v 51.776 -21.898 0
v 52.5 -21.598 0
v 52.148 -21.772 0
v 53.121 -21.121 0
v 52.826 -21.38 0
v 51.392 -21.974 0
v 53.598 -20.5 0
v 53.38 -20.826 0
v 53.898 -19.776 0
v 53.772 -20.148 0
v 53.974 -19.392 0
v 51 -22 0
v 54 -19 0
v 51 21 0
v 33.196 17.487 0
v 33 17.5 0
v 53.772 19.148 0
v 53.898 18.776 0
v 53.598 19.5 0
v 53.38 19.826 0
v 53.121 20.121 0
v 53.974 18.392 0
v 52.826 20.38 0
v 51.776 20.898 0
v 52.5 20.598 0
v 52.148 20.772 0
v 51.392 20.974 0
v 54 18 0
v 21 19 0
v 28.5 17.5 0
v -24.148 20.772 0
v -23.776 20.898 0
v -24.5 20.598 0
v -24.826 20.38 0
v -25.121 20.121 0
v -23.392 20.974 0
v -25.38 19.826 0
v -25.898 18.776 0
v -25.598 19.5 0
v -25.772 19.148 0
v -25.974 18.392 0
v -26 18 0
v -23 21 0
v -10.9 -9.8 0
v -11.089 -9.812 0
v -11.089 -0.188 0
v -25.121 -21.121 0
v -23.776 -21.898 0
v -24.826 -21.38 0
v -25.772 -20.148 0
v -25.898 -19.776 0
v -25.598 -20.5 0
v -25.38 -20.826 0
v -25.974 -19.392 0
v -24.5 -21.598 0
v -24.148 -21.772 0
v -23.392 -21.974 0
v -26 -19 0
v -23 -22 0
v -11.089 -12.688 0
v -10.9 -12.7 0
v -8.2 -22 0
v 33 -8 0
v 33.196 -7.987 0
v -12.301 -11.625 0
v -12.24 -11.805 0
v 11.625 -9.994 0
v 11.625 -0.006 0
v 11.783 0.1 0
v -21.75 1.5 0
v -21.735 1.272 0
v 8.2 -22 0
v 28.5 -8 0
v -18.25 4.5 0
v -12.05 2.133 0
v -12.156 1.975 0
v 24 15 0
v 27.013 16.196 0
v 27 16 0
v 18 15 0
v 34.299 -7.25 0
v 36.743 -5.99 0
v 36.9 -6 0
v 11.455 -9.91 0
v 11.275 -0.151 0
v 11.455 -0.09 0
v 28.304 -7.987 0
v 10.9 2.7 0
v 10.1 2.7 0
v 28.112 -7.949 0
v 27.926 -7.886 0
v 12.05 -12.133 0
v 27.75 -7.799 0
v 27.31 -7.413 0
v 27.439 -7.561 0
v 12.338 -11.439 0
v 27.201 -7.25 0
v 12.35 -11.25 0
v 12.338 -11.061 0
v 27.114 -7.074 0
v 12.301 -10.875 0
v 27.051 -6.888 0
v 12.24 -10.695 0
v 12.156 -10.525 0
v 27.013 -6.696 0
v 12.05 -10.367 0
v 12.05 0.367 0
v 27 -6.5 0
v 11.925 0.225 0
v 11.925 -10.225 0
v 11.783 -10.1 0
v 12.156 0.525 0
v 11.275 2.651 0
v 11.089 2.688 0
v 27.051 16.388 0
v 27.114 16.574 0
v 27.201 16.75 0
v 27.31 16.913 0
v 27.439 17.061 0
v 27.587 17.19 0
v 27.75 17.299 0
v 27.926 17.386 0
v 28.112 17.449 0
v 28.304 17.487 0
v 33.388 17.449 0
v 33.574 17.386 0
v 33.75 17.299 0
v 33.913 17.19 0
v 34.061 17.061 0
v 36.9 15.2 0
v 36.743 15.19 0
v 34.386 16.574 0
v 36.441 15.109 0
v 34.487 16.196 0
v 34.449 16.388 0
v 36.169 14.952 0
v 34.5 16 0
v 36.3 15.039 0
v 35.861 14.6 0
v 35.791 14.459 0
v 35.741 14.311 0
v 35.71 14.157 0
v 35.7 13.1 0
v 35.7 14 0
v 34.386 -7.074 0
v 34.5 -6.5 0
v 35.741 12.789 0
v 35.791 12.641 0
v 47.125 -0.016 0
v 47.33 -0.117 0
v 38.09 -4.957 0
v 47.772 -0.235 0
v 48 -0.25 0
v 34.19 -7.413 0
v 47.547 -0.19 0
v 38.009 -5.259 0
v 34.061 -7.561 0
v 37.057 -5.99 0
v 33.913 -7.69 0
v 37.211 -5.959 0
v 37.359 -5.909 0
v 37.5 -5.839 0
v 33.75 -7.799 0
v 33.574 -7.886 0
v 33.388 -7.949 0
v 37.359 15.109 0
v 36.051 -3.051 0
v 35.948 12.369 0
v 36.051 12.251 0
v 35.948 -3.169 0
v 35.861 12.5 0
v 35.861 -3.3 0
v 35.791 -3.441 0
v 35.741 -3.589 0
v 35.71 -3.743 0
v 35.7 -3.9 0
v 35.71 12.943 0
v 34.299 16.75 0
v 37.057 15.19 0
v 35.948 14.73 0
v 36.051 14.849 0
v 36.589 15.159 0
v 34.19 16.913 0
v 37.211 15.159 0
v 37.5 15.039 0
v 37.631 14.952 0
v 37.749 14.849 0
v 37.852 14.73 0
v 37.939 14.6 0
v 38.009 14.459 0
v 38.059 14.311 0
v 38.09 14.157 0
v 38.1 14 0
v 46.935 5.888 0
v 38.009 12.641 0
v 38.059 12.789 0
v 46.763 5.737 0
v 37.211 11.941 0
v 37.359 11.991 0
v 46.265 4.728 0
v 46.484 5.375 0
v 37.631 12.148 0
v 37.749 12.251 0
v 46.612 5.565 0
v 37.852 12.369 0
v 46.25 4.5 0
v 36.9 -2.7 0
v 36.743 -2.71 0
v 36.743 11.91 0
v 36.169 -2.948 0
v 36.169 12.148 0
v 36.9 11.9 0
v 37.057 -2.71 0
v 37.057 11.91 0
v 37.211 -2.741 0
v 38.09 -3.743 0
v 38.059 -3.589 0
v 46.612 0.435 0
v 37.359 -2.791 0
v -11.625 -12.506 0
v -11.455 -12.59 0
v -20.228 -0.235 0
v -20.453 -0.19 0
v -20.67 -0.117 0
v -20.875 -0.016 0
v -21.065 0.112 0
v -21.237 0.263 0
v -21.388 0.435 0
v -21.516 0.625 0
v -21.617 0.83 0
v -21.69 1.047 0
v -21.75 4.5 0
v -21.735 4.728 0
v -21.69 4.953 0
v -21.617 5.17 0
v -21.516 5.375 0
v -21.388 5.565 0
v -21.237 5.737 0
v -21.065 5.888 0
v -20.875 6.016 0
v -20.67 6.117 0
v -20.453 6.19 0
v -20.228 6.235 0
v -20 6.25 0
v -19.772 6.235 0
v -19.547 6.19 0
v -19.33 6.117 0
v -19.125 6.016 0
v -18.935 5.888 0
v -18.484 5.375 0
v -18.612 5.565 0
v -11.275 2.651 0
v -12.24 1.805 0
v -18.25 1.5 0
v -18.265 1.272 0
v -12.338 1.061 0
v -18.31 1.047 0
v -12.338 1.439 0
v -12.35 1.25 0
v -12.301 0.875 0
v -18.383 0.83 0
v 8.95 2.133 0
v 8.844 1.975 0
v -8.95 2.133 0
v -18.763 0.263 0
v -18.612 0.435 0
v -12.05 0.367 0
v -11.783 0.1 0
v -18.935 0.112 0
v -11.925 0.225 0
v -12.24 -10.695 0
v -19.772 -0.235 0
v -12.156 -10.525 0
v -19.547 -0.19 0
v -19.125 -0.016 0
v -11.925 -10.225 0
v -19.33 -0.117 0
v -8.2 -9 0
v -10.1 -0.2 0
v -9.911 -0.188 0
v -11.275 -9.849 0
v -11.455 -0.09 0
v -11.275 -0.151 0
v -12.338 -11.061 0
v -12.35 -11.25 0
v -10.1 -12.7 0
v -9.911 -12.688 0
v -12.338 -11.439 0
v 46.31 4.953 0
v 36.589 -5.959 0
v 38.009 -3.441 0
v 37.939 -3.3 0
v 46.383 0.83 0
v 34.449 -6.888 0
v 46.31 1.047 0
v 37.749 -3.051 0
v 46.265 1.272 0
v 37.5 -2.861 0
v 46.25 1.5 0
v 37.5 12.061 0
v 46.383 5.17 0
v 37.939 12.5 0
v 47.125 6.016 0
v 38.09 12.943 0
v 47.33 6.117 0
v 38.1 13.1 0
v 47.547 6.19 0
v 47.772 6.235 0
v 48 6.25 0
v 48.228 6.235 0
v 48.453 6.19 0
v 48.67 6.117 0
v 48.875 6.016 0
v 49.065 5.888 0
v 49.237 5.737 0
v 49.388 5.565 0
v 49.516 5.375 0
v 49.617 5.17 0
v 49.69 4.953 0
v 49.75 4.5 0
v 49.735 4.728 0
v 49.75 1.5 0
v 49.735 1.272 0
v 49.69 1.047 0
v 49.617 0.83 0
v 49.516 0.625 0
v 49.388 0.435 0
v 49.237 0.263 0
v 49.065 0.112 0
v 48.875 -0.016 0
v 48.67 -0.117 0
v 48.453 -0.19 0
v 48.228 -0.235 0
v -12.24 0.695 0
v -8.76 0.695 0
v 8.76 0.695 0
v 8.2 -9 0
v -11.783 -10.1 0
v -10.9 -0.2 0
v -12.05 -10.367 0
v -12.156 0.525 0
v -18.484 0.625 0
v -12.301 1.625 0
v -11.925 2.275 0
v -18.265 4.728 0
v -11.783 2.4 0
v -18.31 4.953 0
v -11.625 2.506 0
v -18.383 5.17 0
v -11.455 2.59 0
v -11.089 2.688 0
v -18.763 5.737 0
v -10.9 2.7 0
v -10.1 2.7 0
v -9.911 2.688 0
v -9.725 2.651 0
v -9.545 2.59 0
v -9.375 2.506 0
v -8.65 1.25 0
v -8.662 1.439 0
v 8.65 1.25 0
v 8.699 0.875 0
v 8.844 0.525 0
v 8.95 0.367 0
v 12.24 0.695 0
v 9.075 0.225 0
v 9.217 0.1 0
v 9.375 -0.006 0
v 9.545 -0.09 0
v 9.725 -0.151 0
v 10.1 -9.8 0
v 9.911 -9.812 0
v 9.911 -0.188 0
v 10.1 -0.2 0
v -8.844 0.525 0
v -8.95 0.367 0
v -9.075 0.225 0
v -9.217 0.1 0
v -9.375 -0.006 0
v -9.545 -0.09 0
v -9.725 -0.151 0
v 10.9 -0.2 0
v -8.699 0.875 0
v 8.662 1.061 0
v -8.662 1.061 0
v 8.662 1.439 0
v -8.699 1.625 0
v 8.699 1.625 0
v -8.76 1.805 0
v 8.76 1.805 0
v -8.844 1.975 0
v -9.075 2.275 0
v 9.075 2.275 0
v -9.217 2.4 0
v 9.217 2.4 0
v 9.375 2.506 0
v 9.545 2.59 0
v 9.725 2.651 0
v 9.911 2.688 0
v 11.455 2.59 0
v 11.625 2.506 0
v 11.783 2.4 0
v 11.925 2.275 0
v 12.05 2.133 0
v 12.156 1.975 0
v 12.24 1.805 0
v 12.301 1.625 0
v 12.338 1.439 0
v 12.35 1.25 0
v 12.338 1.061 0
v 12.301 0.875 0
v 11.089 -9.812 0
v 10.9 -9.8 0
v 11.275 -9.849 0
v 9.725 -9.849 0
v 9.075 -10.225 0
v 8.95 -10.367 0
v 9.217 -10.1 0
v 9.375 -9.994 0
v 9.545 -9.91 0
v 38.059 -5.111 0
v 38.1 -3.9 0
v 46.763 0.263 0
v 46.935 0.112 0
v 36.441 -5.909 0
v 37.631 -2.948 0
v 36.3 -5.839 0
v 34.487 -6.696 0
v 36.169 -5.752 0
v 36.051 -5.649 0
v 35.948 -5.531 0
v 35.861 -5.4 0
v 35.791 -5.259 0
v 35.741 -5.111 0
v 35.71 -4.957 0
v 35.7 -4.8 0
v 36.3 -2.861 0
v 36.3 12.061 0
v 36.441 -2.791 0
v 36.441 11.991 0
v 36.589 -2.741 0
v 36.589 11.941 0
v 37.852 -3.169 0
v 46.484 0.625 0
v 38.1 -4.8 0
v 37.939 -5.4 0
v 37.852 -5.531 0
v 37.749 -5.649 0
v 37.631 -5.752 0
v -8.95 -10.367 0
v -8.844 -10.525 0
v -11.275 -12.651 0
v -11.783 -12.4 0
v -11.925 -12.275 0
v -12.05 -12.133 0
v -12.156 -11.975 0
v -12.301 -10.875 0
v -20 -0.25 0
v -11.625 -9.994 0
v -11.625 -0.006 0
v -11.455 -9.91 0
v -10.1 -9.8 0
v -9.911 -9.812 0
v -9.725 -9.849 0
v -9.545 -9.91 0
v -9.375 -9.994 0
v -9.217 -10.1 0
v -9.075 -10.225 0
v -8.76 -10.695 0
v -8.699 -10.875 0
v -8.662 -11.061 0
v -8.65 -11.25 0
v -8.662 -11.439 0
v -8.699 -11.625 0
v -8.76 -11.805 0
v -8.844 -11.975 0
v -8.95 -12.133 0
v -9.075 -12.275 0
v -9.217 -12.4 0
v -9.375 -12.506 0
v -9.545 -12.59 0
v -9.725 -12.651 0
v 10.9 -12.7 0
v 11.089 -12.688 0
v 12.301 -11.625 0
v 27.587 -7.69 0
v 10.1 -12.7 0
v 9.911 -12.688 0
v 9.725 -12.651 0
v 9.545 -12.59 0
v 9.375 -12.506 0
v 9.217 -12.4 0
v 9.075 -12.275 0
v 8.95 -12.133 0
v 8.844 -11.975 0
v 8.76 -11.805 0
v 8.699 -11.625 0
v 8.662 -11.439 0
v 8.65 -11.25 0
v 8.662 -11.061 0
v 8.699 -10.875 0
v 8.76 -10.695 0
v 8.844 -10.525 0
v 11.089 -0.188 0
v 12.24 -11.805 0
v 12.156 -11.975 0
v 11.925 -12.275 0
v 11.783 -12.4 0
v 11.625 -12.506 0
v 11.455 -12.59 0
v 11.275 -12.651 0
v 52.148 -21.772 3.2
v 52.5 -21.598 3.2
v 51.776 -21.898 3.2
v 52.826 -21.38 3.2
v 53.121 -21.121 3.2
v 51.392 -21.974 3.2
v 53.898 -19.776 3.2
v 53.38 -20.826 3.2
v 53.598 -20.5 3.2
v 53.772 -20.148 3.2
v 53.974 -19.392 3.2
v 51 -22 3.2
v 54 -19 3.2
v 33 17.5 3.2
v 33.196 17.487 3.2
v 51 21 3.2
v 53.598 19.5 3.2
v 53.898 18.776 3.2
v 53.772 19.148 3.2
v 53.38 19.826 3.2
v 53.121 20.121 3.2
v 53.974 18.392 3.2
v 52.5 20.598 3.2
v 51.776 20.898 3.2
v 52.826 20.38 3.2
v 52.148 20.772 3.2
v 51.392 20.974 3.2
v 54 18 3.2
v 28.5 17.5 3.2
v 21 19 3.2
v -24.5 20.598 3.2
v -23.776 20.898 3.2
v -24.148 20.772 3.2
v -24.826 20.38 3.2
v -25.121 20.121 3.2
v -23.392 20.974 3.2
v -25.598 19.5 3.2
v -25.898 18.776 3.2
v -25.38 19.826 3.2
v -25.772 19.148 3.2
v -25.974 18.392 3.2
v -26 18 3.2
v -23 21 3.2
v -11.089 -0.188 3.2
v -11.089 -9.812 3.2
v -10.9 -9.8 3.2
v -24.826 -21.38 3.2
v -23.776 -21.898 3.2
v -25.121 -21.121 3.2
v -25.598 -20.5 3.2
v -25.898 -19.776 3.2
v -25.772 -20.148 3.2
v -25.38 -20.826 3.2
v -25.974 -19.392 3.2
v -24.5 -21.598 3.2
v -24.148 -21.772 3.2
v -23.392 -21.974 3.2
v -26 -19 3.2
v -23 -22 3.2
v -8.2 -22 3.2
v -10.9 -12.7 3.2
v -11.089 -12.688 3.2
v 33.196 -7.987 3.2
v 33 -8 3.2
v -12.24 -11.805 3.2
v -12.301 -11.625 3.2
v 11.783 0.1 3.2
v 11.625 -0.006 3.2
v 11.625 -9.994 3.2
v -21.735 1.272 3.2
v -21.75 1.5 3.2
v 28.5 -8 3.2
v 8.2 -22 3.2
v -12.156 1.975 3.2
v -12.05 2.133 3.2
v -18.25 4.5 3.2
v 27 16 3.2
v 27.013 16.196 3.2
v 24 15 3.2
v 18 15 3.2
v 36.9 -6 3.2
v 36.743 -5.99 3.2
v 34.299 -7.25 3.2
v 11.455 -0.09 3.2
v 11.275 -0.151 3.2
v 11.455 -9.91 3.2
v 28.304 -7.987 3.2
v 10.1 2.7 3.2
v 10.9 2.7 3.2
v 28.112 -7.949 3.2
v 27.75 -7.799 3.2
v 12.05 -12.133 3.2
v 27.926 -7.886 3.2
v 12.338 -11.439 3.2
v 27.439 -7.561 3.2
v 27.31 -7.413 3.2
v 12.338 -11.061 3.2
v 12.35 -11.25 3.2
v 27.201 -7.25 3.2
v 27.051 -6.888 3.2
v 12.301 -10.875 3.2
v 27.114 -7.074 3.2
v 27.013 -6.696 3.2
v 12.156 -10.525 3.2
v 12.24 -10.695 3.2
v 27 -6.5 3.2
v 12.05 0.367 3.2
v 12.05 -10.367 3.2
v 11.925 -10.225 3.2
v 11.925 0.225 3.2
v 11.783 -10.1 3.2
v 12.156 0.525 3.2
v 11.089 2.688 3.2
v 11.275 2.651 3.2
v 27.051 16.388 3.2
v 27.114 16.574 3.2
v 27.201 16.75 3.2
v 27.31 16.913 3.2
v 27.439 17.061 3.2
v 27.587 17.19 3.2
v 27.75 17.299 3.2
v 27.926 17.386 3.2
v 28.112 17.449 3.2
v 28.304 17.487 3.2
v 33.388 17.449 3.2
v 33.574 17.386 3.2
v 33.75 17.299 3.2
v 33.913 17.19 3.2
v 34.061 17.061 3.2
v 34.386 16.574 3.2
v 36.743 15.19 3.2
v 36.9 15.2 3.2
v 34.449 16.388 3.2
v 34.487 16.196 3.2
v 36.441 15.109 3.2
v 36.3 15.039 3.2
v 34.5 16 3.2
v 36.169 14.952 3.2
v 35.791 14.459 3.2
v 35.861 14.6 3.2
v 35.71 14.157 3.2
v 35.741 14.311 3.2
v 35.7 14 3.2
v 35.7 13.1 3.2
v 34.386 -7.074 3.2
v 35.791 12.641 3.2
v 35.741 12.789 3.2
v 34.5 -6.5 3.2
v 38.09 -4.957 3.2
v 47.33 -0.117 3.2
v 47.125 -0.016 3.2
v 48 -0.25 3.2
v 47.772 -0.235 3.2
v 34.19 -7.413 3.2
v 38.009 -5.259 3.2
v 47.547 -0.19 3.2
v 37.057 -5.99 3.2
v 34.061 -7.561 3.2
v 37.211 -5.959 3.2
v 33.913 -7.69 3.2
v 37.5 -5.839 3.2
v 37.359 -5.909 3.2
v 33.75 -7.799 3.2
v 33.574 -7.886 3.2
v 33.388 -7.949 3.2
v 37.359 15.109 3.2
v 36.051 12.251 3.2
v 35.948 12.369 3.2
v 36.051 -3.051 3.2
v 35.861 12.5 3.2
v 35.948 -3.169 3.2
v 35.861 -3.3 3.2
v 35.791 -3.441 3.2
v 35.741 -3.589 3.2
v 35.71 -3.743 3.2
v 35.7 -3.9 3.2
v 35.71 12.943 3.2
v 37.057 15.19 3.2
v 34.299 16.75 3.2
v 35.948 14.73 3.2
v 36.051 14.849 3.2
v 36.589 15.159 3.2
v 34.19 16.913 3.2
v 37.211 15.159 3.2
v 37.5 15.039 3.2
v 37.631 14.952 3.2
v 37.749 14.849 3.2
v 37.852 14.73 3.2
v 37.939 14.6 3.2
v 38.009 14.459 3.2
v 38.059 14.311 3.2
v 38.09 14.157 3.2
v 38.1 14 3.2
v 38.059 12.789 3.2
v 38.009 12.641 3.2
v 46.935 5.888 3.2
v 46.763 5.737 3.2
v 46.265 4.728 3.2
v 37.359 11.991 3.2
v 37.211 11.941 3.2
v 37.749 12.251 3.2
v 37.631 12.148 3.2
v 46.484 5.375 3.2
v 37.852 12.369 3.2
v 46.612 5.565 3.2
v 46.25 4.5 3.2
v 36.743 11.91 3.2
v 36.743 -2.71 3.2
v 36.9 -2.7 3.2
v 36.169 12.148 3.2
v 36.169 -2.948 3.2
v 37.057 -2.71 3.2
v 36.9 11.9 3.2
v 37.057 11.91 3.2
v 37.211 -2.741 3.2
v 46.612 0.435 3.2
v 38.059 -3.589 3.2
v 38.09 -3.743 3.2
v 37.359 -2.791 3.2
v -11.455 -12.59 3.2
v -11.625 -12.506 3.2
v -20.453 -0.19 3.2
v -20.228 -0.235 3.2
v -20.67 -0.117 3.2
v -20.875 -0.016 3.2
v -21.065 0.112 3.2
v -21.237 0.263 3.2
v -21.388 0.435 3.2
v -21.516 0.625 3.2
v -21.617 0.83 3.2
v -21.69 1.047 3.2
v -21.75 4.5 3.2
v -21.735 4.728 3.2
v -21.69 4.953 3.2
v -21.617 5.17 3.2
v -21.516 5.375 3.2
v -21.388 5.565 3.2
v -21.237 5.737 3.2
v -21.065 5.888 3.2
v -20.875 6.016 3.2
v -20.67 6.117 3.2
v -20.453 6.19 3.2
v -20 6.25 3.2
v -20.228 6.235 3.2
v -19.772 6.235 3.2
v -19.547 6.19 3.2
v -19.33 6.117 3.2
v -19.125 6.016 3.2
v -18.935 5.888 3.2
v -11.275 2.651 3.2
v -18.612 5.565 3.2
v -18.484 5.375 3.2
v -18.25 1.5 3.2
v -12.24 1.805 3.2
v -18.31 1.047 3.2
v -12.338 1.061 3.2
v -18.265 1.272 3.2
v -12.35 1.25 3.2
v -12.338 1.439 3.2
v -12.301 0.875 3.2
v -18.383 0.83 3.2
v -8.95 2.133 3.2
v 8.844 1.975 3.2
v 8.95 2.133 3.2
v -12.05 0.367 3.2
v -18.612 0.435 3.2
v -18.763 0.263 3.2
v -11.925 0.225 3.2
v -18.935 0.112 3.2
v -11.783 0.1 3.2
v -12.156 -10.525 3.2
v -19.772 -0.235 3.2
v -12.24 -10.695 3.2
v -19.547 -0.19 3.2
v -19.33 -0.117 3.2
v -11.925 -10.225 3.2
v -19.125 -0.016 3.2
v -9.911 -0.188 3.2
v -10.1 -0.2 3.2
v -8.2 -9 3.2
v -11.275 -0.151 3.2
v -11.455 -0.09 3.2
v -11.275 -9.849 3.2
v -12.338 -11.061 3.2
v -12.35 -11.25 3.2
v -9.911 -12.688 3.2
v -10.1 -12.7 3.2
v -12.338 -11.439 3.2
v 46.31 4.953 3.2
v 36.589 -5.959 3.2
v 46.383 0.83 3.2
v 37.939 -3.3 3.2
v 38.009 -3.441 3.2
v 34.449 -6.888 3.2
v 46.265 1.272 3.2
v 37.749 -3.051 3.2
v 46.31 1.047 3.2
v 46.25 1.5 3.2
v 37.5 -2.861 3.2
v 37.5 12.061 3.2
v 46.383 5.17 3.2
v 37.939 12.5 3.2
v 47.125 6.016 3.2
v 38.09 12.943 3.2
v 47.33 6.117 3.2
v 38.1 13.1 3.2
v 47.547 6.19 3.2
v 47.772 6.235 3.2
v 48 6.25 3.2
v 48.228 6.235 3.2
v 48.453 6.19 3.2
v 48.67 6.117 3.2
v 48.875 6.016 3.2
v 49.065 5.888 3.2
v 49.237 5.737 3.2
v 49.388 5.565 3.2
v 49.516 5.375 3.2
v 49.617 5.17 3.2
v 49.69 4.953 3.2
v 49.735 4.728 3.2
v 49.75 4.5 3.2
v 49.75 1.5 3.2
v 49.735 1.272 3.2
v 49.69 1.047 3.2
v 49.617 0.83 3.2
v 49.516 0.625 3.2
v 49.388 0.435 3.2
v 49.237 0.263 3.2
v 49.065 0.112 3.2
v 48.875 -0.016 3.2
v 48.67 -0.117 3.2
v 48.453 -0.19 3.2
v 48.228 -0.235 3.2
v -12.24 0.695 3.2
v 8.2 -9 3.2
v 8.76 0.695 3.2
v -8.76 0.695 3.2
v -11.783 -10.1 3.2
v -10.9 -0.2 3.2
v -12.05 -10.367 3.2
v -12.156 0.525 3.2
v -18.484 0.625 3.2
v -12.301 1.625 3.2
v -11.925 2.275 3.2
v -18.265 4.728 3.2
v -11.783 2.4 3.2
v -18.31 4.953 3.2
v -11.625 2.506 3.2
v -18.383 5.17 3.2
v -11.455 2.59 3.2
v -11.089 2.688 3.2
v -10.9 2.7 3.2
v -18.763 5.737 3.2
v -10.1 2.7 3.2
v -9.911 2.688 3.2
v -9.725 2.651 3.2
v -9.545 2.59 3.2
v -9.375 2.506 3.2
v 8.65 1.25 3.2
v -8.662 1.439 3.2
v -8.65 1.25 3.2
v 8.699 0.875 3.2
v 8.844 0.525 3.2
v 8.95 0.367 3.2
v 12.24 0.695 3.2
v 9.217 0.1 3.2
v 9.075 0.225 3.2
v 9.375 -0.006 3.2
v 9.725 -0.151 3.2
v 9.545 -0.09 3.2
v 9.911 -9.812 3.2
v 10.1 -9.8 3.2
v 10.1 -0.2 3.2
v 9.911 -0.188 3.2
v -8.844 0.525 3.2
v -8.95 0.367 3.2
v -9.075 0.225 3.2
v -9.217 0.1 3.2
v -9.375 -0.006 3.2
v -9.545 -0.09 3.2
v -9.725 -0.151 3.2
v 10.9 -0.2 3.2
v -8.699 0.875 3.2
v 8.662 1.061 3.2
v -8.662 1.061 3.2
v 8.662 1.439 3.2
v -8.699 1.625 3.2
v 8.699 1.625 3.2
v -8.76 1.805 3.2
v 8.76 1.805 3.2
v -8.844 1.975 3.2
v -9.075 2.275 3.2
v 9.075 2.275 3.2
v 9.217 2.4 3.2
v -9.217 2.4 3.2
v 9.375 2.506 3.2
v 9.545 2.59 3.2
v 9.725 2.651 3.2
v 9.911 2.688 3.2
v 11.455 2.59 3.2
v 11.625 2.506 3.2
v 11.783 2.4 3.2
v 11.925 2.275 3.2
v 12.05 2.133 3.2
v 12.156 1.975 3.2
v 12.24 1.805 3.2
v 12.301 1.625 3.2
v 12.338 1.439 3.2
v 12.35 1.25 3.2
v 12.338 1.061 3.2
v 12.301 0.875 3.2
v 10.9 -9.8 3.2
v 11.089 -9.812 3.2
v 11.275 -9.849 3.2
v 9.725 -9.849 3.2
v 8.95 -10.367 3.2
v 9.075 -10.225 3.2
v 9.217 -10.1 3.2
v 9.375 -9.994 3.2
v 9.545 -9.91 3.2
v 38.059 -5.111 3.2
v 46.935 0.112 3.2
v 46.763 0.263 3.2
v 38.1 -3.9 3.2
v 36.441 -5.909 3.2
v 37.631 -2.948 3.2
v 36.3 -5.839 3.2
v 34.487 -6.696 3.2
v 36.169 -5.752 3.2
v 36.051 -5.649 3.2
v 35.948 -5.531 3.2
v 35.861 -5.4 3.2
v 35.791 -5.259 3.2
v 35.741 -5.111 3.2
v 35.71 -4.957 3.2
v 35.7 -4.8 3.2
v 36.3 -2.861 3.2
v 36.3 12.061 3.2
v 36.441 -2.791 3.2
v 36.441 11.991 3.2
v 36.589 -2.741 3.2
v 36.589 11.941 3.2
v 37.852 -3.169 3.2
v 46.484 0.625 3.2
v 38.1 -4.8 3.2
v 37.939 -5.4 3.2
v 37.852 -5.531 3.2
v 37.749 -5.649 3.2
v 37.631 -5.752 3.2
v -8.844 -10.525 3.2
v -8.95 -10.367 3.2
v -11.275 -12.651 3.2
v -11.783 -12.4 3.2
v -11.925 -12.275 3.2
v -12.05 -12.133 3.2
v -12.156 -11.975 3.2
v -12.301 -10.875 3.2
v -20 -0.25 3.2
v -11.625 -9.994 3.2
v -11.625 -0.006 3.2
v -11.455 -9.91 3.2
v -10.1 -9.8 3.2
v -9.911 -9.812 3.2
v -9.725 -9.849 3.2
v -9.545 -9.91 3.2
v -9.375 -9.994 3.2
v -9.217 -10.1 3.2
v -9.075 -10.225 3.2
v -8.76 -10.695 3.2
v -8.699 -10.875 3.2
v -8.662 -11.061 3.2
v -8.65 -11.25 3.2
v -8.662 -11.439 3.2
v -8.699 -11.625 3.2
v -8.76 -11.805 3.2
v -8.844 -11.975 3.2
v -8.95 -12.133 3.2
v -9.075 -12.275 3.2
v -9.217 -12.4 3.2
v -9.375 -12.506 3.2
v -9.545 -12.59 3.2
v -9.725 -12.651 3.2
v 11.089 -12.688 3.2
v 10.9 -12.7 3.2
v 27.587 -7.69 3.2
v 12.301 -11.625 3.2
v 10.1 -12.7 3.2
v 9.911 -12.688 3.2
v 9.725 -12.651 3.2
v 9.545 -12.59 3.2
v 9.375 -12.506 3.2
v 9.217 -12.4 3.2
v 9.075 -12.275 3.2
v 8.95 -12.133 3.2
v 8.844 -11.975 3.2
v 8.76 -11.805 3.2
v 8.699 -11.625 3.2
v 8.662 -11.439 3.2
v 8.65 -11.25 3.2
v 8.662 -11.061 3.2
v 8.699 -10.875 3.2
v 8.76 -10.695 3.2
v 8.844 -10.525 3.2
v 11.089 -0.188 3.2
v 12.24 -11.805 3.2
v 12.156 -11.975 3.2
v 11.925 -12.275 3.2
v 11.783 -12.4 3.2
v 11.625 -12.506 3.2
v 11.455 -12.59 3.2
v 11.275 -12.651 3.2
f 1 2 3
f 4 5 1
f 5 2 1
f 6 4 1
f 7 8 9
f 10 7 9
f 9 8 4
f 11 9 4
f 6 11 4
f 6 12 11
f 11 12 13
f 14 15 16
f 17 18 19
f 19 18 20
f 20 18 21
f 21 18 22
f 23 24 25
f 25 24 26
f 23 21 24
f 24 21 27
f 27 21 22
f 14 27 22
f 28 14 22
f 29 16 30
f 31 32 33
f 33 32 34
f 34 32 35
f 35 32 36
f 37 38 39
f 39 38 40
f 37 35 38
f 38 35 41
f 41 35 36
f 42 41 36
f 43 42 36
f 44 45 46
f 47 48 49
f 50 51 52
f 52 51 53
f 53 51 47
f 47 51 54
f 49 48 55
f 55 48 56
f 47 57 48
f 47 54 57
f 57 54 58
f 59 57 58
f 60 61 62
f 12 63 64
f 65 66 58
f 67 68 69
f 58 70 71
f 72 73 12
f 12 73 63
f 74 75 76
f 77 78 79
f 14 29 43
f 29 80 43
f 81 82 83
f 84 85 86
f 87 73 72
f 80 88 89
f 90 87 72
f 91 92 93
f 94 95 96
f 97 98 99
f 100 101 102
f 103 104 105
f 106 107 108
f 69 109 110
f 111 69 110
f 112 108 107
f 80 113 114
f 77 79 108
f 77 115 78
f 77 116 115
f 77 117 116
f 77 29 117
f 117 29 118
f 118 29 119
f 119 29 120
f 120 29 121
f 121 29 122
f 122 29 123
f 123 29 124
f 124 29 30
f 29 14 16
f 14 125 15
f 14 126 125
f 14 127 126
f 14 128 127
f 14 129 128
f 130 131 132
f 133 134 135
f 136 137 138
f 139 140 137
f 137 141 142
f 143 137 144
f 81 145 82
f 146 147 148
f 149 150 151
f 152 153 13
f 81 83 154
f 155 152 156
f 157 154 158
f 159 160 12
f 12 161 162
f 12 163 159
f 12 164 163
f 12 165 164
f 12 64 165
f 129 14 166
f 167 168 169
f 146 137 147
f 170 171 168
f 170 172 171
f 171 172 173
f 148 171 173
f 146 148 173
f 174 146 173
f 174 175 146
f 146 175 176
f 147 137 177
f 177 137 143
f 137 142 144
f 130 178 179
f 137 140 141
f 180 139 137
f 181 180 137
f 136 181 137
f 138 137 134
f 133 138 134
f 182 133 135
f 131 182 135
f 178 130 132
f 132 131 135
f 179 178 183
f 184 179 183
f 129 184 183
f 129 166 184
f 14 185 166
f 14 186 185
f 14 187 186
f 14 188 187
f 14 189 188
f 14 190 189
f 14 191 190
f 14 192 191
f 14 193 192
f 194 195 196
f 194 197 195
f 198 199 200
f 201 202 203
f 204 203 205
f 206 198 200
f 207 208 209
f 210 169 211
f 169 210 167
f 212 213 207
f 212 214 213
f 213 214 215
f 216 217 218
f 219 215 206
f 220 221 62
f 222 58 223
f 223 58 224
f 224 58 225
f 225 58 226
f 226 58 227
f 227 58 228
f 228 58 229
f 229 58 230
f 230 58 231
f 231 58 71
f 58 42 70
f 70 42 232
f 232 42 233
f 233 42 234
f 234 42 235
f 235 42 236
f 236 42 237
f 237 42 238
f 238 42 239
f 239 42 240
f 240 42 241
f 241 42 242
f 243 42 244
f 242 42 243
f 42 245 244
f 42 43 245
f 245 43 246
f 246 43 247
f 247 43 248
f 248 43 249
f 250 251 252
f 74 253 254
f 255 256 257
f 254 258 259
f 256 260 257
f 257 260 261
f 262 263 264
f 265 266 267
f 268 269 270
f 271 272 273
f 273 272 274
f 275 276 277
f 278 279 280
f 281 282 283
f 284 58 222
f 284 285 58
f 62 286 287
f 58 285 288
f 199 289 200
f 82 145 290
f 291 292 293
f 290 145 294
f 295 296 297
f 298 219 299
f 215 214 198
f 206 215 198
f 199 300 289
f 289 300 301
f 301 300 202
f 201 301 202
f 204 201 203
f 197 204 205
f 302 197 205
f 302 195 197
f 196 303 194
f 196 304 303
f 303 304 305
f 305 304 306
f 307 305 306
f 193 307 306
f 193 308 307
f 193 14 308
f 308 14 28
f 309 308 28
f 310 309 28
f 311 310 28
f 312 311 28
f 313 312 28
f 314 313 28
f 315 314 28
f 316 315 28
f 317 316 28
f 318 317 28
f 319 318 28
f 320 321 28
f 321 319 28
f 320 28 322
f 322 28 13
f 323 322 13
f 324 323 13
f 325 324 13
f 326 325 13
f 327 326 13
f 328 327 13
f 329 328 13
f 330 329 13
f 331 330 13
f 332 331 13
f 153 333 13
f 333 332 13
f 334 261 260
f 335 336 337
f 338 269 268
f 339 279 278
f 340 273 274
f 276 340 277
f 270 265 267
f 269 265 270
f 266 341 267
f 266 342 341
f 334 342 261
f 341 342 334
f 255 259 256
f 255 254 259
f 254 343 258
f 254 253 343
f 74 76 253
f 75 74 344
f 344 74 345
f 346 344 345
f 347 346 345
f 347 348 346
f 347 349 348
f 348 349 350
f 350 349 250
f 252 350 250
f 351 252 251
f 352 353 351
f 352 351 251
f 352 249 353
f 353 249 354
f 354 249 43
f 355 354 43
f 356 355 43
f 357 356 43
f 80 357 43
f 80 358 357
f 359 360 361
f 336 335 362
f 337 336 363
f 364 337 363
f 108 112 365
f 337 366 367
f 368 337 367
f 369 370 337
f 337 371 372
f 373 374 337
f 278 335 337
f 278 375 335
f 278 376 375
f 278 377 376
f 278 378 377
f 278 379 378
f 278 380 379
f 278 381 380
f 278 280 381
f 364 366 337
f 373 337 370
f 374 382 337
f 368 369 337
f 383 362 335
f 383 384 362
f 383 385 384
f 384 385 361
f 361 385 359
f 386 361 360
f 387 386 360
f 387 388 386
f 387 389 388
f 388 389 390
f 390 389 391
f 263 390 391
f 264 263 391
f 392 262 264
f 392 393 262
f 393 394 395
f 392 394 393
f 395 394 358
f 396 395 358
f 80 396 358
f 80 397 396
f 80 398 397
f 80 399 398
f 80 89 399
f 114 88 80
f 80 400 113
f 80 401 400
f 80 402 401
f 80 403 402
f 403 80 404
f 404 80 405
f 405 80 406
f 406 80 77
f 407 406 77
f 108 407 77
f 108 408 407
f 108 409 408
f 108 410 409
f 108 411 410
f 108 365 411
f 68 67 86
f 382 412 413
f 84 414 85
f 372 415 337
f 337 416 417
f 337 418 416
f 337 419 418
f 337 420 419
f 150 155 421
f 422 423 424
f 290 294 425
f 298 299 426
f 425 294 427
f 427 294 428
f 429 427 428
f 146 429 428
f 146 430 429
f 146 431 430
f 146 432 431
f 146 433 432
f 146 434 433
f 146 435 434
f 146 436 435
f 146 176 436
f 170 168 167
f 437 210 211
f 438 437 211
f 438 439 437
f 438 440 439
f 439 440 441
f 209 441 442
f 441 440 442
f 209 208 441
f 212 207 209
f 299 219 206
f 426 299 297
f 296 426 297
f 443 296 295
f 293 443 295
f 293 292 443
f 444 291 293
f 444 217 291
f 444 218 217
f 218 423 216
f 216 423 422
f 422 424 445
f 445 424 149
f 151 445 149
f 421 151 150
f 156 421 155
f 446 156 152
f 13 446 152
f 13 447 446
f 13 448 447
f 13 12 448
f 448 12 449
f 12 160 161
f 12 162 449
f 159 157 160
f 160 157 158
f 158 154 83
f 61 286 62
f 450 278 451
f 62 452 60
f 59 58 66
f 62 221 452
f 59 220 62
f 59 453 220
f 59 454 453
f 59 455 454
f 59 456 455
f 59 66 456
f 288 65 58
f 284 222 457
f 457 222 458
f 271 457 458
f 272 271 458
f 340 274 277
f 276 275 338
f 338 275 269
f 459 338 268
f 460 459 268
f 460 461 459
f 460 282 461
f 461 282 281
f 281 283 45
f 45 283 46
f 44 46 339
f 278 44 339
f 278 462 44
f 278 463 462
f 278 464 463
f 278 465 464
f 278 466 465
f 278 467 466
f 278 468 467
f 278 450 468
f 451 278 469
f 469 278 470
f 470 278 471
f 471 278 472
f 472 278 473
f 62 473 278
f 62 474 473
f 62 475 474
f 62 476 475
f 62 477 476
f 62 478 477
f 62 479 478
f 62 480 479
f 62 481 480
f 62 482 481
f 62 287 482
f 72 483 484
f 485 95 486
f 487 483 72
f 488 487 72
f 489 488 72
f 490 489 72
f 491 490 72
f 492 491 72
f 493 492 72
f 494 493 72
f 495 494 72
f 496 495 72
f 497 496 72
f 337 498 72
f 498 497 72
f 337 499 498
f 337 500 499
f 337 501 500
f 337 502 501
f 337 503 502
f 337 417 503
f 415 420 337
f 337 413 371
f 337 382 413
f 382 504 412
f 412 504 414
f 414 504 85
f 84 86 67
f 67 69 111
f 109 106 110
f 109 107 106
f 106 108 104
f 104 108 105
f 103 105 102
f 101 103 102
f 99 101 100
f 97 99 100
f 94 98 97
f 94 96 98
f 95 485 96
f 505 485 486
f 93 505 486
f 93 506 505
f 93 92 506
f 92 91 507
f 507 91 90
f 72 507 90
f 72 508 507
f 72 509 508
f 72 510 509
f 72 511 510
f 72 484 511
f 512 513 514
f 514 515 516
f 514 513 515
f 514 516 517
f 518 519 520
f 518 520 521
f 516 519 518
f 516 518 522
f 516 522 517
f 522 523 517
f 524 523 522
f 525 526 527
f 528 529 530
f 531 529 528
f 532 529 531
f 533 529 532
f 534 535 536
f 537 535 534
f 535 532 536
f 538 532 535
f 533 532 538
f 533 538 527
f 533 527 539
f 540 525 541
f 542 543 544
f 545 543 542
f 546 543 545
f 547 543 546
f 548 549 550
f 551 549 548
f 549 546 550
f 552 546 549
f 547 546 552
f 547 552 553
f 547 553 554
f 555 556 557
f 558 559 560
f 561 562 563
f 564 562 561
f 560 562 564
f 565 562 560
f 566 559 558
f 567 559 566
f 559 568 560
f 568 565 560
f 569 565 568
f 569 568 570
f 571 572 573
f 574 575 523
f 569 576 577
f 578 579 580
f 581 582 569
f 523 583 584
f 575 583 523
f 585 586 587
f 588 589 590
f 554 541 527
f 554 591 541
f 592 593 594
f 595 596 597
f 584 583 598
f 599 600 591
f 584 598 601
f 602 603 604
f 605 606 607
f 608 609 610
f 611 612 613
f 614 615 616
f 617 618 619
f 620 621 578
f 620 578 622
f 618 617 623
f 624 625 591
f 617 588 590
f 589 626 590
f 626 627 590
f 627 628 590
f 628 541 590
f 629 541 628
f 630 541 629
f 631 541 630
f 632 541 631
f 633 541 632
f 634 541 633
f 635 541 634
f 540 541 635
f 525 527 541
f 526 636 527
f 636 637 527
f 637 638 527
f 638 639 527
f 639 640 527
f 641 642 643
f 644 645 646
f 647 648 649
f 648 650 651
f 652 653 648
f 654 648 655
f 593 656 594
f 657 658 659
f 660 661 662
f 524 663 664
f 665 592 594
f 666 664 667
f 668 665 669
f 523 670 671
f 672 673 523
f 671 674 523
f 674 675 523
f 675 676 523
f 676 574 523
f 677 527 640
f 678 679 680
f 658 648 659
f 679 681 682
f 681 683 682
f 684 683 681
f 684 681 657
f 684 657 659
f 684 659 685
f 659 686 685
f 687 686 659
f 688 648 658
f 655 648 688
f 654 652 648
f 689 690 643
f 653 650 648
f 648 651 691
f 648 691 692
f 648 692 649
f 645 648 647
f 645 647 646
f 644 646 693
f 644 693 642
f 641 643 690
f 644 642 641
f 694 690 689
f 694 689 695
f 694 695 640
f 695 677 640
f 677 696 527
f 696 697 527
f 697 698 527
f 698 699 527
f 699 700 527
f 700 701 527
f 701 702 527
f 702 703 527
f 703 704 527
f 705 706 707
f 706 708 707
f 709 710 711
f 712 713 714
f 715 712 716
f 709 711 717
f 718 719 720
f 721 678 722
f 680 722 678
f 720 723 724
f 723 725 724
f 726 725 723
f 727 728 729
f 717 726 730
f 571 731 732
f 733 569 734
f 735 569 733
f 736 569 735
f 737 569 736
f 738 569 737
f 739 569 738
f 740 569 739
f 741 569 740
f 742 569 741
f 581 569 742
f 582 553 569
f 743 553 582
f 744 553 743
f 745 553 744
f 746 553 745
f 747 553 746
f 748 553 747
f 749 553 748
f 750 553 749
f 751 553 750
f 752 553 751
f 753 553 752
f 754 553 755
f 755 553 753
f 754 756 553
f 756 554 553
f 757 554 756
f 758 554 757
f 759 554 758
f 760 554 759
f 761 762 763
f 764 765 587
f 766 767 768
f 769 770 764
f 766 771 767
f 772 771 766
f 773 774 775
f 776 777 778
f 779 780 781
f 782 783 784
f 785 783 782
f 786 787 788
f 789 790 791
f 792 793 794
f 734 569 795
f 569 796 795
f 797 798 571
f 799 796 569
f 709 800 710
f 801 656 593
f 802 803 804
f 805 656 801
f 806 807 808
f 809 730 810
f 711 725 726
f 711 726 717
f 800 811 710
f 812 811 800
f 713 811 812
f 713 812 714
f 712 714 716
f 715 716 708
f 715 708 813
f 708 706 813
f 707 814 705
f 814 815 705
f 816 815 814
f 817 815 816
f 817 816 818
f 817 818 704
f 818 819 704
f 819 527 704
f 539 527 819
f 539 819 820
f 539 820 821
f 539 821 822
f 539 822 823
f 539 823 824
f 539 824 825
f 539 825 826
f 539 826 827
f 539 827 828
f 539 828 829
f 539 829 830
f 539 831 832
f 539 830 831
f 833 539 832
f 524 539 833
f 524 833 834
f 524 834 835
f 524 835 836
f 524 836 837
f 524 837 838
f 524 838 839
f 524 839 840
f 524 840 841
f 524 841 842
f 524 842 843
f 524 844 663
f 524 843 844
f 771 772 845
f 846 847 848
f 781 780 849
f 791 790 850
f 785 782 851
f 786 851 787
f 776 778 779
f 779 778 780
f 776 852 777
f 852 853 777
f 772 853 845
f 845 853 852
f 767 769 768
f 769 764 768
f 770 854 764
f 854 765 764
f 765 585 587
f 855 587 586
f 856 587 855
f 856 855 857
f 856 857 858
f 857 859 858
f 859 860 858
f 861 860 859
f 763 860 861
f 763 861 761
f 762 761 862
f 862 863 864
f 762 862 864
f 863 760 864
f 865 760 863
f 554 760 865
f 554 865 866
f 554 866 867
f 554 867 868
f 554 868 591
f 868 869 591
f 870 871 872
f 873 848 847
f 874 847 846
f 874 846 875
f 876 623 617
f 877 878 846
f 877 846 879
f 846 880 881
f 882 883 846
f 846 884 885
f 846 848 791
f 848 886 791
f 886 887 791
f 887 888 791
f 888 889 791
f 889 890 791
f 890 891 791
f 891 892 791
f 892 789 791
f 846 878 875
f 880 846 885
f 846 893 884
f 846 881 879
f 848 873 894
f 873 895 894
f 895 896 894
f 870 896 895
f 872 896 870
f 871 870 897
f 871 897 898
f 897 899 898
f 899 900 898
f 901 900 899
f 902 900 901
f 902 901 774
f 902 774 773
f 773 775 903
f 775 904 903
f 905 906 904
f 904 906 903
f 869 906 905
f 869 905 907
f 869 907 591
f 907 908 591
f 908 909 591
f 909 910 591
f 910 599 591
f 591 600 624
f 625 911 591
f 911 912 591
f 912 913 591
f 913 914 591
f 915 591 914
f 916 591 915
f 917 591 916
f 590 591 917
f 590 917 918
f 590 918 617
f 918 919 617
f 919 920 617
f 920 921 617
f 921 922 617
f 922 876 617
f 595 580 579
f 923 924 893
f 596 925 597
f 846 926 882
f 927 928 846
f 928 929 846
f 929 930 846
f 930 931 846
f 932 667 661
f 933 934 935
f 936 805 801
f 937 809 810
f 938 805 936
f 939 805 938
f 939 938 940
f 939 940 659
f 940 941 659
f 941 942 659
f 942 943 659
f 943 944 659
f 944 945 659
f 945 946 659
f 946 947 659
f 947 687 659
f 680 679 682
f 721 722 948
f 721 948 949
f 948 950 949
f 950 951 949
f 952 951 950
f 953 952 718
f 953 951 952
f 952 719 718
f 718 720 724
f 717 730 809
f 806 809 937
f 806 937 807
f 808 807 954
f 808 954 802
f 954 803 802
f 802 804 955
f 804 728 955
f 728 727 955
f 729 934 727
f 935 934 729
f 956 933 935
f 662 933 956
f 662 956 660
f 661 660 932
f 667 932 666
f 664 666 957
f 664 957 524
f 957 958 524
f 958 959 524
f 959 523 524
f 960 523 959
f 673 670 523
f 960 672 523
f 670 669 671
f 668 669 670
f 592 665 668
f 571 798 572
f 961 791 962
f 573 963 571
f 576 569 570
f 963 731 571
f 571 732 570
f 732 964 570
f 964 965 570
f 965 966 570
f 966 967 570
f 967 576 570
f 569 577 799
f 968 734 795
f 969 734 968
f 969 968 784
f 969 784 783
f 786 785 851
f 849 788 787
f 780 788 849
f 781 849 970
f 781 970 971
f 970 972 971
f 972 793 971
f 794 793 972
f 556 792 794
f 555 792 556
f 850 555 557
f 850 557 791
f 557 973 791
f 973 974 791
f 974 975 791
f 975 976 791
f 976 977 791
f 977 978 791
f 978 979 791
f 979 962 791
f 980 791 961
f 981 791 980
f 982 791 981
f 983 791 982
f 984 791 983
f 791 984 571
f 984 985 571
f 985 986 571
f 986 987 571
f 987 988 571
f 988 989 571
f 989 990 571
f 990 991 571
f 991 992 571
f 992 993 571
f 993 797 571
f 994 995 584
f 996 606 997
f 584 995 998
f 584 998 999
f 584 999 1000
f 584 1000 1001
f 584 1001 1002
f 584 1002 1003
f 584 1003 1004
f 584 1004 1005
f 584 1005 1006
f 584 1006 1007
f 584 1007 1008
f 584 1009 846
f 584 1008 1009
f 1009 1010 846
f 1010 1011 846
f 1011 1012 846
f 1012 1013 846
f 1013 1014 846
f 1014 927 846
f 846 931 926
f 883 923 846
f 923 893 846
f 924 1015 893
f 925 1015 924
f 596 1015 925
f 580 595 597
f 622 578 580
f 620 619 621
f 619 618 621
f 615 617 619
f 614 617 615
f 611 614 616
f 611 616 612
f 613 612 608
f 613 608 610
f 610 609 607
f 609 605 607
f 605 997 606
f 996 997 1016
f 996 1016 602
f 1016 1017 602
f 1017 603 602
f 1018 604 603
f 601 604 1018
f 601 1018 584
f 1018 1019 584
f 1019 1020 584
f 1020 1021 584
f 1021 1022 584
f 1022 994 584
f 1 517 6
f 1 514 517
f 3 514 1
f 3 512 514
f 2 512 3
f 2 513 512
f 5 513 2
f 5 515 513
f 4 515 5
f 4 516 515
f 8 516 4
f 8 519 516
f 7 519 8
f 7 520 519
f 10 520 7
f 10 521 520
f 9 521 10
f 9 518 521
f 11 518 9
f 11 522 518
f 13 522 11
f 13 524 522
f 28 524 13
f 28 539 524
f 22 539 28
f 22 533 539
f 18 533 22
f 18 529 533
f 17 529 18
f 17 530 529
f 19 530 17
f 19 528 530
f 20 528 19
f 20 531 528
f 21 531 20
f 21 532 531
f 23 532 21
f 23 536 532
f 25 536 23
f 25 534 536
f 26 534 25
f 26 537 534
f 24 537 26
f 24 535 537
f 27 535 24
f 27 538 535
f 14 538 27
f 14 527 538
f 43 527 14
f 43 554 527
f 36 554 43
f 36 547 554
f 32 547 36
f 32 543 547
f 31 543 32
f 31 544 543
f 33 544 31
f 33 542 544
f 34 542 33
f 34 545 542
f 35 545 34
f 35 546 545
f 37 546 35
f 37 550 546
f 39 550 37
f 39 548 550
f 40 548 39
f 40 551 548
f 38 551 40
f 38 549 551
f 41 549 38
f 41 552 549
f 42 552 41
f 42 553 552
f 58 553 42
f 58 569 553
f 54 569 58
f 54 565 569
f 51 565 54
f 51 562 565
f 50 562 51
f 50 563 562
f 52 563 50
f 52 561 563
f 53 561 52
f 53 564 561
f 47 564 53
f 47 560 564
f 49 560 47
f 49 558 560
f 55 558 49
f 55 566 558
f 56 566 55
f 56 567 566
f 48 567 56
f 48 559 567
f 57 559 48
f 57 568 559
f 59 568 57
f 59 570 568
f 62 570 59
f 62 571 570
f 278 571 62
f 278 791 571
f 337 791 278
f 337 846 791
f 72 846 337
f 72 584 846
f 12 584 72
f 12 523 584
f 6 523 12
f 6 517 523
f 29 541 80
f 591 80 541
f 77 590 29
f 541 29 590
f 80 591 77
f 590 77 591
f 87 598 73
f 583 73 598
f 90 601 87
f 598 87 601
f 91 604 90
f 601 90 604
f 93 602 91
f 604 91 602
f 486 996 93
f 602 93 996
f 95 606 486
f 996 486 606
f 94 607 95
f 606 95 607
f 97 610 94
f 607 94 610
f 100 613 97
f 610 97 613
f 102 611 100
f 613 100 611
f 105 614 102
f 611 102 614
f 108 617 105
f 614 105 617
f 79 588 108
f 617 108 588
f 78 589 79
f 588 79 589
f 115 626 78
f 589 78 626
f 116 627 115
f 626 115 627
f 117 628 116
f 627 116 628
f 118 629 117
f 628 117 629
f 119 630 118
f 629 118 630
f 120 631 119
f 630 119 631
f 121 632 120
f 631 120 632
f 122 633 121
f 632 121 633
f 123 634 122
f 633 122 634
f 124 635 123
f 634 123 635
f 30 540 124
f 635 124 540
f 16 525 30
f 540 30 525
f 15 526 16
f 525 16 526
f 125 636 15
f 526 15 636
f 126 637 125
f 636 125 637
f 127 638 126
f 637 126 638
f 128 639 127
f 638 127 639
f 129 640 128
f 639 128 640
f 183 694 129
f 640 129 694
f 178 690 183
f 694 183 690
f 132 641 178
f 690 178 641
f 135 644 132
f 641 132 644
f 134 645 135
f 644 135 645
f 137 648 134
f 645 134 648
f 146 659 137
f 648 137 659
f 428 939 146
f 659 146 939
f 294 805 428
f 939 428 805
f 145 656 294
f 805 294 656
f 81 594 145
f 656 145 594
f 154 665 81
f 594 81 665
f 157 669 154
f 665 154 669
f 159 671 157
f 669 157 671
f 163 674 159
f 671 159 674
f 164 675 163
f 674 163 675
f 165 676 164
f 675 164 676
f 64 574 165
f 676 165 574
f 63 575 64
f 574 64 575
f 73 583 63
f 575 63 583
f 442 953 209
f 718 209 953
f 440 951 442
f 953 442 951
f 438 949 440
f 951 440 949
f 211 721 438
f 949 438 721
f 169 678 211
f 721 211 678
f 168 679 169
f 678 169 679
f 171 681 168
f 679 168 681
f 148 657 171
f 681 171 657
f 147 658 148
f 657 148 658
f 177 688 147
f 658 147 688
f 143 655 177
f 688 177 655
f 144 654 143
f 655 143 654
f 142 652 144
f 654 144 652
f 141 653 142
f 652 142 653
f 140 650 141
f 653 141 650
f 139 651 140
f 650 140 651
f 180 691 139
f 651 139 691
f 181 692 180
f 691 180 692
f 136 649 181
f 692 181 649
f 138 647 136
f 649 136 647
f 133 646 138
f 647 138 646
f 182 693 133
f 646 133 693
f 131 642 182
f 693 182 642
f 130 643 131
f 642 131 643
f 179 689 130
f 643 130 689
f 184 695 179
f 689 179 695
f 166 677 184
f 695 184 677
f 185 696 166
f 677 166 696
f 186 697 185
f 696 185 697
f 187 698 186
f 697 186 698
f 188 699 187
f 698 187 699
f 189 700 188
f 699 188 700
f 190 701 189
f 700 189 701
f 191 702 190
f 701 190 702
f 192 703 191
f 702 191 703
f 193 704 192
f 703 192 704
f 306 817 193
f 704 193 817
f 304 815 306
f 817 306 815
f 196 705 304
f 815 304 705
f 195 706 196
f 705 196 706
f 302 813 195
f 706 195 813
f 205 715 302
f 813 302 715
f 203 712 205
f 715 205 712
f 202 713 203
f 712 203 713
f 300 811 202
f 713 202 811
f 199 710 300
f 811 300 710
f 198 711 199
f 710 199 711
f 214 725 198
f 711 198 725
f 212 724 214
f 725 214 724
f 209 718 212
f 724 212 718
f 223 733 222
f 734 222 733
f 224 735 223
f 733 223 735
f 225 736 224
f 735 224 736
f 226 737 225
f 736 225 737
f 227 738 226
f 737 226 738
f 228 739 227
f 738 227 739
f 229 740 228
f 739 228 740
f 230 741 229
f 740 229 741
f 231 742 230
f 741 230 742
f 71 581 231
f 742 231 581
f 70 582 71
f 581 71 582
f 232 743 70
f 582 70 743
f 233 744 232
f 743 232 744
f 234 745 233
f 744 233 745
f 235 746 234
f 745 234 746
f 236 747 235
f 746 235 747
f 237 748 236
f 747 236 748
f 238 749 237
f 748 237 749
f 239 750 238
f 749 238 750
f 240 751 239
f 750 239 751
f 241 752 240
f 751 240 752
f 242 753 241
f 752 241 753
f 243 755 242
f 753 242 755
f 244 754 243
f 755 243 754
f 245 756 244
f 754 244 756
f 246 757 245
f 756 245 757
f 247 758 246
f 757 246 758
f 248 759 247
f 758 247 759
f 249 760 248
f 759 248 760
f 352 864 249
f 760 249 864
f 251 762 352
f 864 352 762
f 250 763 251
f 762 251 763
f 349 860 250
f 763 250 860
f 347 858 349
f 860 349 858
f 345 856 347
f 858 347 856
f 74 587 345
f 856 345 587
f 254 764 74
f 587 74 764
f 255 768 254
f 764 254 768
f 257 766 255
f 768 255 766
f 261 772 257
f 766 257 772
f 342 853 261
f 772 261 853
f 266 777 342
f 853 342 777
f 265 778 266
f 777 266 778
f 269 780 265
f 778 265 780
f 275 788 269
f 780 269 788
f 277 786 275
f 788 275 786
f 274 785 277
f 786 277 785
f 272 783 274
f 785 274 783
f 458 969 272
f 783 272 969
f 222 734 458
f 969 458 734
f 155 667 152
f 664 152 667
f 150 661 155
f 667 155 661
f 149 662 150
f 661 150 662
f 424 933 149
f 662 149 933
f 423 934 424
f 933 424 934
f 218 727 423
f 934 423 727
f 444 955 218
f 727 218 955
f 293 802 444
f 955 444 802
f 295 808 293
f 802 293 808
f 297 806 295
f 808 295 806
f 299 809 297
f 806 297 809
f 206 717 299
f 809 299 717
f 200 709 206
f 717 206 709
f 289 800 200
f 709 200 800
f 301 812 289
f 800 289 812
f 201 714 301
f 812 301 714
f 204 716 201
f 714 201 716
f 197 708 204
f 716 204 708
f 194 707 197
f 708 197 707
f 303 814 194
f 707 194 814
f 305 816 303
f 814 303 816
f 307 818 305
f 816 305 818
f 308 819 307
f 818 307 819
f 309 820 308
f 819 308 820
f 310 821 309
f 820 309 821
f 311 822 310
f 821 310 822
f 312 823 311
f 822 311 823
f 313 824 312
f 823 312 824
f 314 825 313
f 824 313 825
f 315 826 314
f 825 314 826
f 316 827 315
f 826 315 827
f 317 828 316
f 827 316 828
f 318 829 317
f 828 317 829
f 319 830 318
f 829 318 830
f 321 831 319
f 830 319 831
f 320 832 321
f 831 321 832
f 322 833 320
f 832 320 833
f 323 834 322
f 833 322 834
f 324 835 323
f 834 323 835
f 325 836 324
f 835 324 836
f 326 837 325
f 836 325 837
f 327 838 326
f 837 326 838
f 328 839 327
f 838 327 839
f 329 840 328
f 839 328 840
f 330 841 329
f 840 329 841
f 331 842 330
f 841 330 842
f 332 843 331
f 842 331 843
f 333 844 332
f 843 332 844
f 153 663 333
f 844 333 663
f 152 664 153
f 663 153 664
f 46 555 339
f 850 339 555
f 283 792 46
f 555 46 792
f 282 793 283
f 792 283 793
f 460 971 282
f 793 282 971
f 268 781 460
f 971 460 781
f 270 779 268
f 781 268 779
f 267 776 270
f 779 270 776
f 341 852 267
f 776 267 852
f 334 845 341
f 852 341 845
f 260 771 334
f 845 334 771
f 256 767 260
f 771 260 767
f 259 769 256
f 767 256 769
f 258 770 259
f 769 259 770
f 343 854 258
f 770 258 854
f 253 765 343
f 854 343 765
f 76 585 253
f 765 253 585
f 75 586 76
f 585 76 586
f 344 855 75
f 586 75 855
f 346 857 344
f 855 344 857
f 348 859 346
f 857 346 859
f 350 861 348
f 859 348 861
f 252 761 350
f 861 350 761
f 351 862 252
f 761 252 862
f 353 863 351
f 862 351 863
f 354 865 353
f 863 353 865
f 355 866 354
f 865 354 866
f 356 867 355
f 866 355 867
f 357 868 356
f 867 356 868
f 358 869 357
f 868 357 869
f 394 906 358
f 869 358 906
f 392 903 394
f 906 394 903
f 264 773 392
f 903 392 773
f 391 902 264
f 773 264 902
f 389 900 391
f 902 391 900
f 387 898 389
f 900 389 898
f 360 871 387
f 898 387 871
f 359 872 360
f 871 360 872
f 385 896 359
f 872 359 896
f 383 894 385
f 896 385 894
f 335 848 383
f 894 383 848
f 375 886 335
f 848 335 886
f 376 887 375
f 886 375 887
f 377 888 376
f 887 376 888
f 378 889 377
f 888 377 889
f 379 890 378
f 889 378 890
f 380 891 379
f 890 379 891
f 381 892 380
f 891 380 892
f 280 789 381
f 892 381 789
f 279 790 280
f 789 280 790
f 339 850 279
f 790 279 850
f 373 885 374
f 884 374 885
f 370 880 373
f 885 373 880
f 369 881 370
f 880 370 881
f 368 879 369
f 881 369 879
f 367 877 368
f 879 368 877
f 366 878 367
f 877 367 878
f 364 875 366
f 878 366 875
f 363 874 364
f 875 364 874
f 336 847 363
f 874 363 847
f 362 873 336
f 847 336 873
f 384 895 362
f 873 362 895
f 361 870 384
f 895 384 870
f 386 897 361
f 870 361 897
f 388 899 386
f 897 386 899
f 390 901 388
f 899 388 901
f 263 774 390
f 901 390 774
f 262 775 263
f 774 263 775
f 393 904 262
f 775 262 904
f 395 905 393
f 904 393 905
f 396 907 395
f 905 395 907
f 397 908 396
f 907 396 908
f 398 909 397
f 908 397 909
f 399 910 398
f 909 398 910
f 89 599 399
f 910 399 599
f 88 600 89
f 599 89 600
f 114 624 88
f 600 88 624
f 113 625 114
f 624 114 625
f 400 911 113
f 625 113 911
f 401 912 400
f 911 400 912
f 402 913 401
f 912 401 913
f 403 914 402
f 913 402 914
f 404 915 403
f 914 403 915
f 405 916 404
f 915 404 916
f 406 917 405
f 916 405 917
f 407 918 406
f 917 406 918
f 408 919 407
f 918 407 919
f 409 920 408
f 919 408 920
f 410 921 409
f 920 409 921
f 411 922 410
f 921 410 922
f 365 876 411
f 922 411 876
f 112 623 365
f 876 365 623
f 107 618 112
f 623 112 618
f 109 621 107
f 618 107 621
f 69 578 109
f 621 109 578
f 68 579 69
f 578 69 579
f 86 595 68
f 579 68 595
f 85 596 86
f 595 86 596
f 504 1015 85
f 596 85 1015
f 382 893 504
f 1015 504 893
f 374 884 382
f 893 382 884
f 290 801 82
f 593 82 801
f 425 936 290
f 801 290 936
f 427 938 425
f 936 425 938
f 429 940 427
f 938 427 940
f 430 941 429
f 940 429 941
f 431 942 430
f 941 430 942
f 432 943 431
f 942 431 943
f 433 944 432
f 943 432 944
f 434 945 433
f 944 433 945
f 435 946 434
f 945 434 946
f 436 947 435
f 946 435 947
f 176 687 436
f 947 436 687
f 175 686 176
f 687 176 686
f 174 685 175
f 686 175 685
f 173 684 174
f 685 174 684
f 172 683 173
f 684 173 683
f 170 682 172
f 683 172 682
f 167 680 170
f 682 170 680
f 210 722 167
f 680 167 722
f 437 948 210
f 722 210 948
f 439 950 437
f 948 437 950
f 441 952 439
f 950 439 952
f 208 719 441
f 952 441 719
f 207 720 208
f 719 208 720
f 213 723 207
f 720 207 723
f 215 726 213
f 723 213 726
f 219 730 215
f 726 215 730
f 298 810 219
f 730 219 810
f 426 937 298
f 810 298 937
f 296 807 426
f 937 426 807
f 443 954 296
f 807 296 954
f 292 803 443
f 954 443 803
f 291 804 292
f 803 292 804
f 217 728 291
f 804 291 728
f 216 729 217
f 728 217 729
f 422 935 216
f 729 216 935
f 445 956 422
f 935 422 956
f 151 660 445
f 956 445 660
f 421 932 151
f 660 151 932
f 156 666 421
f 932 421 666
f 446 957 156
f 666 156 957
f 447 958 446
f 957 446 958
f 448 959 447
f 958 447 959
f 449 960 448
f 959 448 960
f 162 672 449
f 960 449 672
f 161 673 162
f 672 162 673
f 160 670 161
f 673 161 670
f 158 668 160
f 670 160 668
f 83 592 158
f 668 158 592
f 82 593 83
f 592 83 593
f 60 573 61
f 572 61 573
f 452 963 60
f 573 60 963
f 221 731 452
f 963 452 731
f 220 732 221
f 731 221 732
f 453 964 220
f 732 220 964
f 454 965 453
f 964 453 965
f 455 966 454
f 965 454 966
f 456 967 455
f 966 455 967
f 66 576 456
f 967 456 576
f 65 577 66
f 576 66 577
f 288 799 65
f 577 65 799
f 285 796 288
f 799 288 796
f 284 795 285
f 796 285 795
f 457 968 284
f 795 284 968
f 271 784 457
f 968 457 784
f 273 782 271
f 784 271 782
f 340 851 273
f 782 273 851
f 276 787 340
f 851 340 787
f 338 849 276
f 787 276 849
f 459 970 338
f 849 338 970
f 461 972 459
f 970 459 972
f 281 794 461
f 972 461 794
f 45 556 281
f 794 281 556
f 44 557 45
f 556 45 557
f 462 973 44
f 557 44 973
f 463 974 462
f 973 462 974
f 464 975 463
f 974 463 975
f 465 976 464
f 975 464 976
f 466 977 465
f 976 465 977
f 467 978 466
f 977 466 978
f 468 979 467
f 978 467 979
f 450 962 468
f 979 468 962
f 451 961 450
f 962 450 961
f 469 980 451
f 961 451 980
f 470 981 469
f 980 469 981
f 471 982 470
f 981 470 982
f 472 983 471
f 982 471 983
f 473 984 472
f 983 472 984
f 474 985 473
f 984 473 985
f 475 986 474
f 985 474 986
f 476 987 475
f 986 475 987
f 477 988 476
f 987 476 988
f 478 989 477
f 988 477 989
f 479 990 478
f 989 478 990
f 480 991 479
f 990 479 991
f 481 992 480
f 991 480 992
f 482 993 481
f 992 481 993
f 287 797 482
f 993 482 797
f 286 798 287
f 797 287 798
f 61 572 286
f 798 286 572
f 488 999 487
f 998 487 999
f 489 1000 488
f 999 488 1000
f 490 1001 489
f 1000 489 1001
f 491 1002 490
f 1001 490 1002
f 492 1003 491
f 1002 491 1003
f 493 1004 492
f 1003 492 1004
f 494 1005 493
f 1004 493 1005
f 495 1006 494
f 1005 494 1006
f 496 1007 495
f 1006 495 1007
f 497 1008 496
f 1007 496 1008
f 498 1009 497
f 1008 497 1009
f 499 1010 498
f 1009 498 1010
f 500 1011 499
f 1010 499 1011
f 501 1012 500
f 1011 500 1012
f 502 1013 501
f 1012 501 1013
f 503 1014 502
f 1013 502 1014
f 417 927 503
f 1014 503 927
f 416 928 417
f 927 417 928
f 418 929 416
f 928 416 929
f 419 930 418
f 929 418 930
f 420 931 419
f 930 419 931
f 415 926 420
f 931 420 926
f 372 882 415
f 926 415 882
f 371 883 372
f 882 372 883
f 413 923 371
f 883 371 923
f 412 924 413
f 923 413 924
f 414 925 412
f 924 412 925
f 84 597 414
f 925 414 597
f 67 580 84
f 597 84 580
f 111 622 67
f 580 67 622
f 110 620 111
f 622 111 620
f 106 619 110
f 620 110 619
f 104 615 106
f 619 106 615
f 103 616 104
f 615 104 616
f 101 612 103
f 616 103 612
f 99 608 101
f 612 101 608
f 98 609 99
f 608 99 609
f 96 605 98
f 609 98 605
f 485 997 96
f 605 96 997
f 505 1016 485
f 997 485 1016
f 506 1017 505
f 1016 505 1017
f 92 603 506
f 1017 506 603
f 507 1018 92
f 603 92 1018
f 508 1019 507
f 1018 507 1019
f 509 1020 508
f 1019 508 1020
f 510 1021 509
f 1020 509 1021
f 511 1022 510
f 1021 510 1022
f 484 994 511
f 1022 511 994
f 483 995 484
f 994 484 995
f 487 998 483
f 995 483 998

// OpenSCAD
// PlatypusOne removable perception-head test plate. Millimeters.
// Board component/optics sides face +Z, away from the plate.
// Face-on view: camera left, ToF right, camera ribbon exits toward -Y.
$fn = 48;
plate_t = 3.2;
cam_origin = [0,-5]; // center of the camera's rectangular hole pattern
cam_pitch = [21,12.5]; // nominal from the B0394 drawing, bench fit pending
tof_center = [33,4.6]; // nominal sensor location, not a measured baseline
tof_hole_x = 10.2-6.3; // carrier hole and sensor X, both from the left edge
tof_pitch = 22.9-2*2.5;
ear_centers = [-20,48];

module slot(span, width, angle=0) {
    rotate(angle) hull() {
        translate([-span/2,0]) circle(d=width);
        translate([ span/2,0]) circle(d=width);
    }
}

module rounded_outline(x0,y0,x1,y1,r) {
    hull() for(x=[x0+r,x1-r]) for(y=[y0+r,y1-r])
        translate([x,y]) circle(r=r);
}

linear_extrude(height=plate_t, convexity=8)
difference() {
    rounded_outline(-26,-22,54,21,3);
    // Rear FFC exit and latch access. The bottom of the notch is open.
    translate([-8.2,-23]) square([16.4,14]);
    // Relief below the ToF through-hole wiring. Fit spacers for the rest.
    rounded_outline(27,-8,34.5,17.5,1.5);
    // Short horizontal adjustment on each B0394 fastener.
    for(x=[-1,1]) for(y=[-1,1])
        translate(cam_origin + [x*cam_pitch.x/2,y*cam_pitch.y/2]) slot(0.8,2.9);
    // Pololu drawing: 17.9 mm pitch, not the 11.4 mm sensor-center dimension.
    for(y=[-1,1])
        translate(tof_center+[tof_hole_x,y*tof_pitch/2]) slot(0.9,2.4,90);
    // Two external M3 slots for a test stand, clamp plate, or future shell.
    for(x=ear_centers) translate([x,3]) slot(3,3.5,90);
    // Orientation index, points UP from the optics side.
    polygon([[18,15],[24,15],[21,19]]);
}
